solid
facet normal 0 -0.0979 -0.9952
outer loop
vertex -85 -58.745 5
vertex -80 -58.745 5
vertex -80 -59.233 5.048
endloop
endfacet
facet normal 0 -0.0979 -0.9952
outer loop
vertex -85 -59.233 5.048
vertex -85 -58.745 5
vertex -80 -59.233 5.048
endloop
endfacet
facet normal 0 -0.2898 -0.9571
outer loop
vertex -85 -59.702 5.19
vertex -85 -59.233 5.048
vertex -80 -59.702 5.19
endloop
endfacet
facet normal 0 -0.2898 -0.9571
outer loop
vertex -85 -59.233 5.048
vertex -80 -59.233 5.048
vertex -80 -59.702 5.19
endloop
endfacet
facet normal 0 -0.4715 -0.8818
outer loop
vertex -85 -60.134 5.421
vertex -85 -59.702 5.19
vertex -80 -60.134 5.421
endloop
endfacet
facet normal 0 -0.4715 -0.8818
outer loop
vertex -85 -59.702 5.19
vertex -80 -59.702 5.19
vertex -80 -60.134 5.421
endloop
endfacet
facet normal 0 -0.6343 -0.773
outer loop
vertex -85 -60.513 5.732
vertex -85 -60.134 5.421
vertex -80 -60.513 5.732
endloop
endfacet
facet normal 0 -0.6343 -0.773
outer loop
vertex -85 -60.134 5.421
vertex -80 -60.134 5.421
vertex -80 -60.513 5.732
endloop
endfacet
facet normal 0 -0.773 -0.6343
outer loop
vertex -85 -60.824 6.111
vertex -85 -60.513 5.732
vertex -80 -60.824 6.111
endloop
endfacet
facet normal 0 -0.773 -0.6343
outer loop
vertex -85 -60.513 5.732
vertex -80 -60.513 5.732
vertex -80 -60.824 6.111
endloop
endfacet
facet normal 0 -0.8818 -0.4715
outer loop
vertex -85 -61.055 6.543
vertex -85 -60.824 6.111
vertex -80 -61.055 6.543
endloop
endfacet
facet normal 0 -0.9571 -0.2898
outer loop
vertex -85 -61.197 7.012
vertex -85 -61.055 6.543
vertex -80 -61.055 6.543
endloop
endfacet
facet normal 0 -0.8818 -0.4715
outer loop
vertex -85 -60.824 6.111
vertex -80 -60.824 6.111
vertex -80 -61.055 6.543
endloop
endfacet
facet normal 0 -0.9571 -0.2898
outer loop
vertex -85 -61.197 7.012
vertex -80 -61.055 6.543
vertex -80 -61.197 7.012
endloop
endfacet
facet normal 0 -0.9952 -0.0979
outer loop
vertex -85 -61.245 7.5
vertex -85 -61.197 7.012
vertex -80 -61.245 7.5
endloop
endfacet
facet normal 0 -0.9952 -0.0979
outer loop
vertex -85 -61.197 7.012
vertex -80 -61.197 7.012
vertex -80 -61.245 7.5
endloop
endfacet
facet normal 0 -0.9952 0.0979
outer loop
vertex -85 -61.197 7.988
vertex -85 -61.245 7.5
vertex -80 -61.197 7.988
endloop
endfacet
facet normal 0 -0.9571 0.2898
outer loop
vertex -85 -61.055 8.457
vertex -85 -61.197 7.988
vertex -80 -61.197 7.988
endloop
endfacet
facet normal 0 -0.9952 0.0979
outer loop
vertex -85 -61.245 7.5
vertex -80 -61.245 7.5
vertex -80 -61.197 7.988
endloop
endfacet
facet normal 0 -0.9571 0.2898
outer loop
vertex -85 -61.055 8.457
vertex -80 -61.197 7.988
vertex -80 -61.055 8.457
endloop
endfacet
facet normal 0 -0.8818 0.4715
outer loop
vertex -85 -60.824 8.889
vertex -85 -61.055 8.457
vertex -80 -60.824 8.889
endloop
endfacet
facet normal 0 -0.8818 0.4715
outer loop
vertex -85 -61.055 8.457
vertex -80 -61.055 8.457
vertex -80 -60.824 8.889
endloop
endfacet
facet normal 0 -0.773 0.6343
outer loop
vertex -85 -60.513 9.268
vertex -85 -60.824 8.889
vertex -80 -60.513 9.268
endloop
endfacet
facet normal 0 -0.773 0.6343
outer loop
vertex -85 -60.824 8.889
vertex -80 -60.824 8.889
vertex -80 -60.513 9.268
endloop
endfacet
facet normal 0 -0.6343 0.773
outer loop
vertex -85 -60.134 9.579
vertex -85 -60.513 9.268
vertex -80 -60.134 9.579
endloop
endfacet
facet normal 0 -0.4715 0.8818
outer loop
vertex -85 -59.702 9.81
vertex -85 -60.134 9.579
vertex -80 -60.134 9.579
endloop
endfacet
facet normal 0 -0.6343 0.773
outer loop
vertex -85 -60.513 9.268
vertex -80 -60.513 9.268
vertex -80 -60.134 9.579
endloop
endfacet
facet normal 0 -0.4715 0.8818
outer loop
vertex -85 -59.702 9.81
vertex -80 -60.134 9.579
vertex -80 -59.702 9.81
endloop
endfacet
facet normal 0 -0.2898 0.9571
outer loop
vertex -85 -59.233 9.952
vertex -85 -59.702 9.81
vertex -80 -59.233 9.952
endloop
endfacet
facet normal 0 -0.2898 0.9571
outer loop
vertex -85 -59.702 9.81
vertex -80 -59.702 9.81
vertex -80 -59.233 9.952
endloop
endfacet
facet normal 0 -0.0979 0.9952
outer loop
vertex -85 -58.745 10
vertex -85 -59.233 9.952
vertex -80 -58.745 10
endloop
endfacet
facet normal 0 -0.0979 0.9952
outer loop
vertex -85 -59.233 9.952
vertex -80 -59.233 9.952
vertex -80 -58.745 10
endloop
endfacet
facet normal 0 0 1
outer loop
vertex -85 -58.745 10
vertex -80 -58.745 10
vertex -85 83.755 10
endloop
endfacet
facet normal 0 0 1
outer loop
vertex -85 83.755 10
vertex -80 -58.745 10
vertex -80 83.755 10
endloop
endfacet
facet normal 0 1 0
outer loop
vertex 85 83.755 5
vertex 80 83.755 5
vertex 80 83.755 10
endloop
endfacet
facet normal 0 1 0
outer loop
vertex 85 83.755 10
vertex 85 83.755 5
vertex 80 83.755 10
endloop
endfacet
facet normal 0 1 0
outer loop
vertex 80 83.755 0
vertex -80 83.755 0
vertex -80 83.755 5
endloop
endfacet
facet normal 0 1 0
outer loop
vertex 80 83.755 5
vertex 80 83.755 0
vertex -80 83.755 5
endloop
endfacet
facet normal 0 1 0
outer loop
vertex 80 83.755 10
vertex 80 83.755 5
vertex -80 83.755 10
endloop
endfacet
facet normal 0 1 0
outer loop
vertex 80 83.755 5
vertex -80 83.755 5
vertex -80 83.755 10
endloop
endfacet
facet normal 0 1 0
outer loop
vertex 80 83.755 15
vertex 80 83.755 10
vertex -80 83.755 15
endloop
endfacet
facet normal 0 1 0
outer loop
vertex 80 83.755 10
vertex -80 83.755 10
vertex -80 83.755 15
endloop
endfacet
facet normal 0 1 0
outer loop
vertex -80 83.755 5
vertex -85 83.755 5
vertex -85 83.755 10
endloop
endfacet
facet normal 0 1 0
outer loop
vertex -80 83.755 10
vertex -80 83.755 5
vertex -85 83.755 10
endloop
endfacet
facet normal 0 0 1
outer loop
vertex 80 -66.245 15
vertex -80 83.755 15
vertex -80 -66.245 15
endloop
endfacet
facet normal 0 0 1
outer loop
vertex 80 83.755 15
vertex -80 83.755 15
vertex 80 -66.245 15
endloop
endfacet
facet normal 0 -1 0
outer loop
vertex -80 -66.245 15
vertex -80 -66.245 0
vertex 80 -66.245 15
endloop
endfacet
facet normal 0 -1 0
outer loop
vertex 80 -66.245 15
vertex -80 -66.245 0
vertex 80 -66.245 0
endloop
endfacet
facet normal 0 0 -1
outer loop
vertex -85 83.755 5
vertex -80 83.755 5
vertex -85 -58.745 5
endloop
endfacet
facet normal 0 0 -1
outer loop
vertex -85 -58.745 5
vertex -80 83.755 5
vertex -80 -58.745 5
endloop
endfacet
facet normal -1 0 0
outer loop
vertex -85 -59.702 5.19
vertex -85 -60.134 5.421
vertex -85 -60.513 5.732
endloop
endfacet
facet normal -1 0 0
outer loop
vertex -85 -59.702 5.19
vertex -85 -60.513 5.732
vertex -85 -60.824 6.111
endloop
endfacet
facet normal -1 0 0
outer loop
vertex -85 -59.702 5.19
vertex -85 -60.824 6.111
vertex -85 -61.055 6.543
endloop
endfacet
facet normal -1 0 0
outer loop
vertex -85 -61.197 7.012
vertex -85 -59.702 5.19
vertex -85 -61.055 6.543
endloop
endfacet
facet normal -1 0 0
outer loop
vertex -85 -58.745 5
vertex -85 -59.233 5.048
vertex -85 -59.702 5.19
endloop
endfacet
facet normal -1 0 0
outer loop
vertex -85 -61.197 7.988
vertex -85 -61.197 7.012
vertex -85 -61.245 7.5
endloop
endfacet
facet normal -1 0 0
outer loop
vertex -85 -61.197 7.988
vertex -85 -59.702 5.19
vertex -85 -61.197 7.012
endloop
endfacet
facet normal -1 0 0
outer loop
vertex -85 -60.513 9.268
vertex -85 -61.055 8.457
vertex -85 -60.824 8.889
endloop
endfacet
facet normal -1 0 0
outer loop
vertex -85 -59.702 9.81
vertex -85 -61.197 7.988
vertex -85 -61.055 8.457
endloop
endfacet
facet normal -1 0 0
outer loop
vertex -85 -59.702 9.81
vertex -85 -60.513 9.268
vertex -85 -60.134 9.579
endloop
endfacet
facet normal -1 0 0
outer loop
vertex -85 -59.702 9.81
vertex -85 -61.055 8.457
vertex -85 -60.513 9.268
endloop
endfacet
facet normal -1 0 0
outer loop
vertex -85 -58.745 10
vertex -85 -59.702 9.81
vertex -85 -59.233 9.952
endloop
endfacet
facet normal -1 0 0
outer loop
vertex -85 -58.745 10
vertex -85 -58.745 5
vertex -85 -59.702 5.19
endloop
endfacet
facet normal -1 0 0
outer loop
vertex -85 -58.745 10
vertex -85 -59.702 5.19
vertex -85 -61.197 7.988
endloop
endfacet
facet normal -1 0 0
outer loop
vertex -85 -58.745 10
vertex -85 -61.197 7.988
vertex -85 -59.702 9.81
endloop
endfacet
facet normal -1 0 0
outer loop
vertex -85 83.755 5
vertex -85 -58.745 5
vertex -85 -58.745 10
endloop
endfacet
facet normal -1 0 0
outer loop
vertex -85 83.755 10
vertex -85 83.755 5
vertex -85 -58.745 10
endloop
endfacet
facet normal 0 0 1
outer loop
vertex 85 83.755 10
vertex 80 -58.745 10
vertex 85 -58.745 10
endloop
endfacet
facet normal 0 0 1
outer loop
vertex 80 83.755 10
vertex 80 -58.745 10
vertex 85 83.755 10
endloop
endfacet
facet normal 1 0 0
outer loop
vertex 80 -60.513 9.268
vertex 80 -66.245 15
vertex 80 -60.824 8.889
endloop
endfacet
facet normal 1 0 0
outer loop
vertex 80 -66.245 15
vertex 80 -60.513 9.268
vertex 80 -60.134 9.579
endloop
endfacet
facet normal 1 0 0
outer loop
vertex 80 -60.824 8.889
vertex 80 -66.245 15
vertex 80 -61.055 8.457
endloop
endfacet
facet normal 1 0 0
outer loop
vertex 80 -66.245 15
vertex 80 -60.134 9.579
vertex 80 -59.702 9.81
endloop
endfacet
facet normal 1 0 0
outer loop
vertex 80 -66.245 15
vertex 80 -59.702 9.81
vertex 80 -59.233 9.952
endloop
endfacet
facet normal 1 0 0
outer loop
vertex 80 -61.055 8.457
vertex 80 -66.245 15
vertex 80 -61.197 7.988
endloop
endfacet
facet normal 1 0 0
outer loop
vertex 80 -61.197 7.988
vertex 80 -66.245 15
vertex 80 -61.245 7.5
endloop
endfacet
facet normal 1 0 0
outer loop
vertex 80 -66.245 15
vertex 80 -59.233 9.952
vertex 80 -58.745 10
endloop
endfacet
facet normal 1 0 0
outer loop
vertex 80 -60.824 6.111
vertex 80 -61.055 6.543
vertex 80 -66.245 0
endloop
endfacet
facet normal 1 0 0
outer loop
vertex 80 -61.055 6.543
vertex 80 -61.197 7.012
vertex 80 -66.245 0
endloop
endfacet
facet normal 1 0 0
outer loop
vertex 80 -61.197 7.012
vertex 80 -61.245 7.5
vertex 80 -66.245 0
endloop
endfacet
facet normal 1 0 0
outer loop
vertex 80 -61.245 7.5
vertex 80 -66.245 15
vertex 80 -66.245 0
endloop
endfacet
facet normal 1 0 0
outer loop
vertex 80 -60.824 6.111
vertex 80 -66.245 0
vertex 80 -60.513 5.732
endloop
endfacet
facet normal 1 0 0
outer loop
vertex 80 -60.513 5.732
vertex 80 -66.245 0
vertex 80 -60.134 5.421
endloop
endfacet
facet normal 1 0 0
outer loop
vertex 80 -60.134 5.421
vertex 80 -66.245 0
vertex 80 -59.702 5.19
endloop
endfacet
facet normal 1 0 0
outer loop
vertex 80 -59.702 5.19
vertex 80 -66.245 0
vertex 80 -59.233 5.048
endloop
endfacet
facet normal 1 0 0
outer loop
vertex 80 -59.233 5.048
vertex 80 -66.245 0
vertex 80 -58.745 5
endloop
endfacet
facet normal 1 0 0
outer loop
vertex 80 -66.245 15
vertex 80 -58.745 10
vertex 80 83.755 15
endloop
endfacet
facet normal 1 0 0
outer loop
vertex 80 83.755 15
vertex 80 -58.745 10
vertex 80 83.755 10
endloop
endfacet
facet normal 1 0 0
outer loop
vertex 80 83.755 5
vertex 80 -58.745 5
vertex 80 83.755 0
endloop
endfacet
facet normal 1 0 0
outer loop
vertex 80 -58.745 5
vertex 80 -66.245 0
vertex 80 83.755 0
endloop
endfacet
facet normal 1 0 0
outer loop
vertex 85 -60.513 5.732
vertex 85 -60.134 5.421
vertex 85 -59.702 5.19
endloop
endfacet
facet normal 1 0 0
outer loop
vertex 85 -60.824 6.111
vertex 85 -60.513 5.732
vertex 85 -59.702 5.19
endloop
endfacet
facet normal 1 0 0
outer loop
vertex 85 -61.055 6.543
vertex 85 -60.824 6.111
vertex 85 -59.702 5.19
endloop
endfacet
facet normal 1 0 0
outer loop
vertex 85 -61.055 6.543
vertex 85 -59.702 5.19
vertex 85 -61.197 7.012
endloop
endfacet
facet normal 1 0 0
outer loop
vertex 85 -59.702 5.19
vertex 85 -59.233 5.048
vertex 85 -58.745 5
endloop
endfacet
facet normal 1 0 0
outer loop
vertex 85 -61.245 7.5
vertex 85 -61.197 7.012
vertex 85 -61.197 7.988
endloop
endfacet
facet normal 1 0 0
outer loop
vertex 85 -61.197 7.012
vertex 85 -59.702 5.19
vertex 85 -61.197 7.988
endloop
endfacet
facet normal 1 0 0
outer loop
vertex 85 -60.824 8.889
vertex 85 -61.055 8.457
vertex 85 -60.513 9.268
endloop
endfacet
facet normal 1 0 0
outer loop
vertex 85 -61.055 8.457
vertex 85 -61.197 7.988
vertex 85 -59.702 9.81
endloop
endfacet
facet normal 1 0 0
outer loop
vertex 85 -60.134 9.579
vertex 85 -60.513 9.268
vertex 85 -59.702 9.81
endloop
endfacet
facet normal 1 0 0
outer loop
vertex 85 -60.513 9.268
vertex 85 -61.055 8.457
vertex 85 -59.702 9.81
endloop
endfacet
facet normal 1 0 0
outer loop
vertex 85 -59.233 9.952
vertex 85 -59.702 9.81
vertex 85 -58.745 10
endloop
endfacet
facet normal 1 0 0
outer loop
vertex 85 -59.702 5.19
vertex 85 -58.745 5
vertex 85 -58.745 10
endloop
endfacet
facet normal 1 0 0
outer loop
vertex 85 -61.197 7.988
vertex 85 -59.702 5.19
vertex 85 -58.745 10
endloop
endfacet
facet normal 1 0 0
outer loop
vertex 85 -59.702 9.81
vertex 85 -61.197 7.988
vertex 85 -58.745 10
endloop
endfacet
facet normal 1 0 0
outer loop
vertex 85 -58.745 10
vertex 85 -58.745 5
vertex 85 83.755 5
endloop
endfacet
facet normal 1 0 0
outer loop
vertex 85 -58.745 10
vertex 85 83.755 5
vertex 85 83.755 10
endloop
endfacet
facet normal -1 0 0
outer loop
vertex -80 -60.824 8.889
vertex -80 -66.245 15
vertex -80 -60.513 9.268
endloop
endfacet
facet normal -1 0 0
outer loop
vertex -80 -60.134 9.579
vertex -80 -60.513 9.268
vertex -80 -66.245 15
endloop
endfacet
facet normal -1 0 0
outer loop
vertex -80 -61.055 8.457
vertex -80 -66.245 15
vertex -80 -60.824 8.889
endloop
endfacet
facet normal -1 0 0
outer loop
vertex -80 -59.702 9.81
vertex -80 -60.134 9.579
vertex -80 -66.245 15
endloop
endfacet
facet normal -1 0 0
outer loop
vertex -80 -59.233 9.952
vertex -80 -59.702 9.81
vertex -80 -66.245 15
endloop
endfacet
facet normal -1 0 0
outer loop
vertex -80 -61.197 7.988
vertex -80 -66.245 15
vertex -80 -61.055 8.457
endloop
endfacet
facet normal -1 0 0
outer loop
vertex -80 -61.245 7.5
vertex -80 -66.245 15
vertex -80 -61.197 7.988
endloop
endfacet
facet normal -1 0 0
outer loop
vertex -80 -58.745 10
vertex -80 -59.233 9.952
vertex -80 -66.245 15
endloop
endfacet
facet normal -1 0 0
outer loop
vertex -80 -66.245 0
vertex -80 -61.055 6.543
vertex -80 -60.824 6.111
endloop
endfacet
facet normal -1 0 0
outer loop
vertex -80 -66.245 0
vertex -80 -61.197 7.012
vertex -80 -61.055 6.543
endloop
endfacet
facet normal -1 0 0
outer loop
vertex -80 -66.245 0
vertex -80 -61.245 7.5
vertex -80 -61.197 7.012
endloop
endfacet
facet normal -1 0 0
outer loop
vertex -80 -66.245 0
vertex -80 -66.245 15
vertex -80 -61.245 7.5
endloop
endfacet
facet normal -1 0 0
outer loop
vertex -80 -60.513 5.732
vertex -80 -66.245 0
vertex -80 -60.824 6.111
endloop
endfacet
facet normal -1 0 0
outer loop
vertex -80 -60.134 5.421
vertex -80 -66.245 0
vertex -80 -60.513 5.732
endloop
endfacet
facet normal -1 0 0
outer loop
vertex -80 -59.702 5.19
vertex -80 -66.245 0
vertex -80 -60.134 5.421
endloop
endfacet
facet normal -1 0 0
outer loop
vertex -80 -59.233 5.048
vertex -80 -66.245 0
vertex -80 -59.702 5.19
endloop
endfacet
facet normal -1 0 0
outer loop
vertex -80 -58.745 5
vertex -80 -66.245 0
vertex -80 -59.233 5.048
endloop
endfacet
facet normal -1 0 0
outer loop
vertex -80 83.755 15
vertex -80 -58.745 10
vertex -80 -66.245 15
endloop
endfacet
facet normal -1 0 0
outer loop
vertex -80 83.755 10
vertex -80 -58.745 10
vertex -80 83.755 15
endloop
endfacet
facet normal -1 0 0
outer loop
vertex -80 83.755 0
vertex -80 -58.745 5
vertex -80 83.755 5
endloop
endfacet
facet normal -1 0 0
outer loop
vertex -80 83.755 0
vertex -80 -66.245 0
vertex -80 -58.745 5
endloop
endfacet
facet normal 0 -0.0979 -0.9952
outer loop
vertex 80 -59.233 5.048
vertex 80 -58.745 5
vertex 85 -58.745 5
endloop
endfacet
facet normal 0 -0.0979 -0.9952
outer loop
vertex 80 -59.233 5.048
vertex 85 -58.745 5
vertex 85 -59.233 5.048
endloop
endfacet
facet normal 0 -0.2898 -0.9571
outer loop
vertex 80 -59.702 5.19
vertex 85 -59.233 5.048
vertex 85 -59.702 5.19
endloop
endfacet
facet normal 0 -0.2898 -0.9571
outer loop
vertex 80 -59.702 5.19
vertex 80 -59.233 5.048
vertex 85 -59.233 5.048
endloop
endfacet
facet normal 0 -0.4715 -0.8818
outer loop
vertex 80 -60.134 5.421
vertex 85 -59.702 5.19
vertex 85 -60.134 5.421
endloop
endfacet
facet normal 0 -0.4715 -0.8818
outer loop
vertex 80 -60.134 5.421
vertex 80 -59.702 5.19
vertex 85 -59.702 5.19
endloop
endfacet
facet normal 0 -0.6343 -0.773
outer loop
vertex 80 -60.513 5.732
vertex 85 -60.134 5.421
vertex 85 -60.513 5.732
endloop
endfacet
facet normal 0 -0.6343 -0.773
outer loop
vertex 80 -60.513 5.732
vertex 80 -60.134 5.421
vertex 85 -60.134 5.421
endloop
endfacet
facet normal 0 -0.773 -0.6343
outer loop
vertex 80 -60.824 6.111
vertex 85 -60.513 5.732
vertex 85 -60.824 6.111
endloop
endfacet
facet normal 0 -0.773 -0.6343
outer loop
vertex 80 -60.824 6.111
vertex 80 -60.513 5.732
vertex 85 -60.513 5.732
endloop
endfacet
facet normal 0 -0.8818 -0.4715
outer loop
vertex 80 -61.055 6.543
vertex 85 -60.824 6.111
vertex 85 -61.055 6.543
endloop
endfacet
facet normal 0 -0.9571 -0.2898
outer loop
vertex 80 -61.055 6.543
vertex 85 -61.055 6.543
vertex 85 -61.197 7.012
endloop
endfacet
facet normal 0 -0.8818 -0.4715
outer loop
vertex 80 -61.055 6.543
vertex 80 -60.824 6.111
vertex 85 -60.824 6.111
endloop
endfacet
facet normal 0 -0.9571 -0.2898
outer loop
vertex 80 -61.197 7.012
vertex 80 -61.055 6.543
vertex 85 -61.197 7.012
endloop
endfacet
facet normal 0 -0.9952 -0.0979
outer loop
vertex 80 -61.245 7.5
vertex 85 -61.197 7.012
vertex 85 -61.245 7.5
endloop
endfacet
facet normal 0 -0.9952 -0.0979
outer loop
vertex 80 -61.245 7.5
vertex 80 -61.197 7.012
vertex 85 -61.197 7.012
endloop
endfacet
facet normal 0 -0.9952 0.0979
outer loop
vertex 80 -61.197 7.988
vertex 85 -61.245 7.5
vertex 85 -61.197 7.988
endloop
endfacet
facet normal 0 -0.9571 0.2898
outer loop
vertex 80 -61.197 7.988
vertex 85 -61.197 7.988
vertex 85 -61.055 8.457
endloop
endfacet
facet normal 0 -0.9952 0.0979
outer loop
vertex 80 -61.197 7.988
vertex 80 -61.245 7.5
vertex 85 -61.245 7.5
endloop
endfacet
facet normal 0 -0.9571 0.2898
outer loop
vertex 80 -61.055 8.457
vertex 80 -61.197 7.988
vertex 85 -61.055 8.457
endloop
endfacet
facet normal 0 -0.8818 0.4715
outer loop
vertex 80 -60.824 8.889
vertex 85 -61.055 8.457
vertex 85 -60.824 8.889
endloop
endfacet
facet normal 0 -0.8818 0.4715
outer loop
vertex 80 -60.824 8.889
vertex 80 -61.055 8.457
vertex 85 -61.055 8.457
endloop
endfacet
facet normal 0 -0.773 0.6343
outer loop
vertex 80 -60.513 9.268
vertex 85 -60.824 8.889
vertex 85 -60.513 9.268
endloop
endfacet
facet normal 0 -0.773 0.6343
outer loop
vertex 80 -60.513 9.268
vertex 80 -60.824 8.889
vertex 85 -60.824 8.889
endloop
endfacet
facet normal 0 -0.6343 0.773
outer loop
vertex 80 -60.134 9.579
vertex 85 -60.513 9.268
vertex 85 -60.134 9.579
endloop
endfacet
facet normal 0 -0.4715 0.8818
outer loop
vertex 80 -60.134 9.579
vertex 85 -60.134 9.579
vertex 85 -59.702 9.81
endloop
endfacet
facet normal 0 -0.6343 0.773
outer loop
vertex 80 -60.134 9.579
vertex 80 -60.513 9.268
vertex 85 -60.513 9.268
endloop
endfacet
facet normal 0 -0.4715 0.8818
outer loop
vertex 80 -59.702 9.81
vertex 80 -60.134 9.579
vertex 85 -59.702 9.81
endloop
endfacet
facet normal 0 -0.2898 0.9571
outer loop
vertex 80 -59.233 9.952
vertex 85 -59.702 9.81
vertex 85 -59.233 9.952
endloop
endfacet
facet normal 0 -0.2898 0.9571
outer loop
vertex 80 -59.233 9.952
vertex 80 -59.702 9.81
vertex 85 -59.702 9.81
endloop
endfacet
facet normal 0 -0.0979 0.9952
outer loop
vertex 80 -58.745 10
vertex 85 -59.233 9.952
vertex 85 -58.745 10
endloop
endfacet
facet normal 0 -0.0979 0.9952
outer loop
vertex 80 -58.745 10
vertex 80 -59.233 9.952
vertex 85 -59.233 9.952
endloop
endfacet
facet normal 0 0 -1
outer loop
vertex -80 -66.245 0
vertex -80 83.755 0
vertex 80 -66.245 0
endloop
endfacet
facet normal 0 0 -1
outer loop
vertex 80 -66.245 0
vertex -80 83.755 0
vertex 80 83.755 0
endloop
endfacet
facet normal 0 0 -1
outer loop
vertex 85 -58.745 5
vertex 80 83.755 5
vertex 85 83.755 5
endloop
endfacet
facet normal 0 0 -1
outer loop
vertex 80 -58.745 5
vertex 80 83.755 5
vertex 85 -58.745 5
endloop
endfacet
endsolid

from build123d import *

# Parameters (mm, degrees)
SKETCH1_W           = 160
SKETCH1_H           = 150
BOSS_EXTRUDE1_DEPTH = 15
BOSS_EXTRUDE2_DEPTH = 5
CUT_EXTRUDE1_DEPTH  = 5


with BuildPart() as part:
    # Sketch1 → Boss-Extrude1 (new body)
    with BuildSketch(Plane.XY):
        with Locations((0, 8.754863813)):
            Rectangle(SKETCH1_W, SKETCH1_H)
    extrude(amount=BOSS_EXTRUDE1_DEPTH)

    # Sketch2 → Boss-Extrude2 (add)
    with BuildSketch(Plane(origin=(80, 0, 0), x_dir=(0, 0, -1), z_dir=(1, 0, 0))):
        with BuildLine():
            Line((-10, -58.745136187), (-10, 89.520228405))
            ThreePointArc((-10, 89.520228405), (-7.5, 92.020228405), (-5, 89.520228405))
            Line((-5, 89.520228405), (-5, -58.745136187))
            ThreePointArc((-5, -58.745136187), (-7.5, -61.245136187), (-10, -58.745136187))
        make_face()
    boss_extrude2 = extrude(amount=BOSS_EXTRUDE2_DEPTH)

    # Mirror1: Boss-Extrude2 across plane
    add(boss_extrude2.mirror(Plane(origin=(0, 0, 0), x_dir=(0, 0, 1), z_dir=(1, 0, 0))))

    # Sketch3 → Cut-Extrude1 (cut)
    with BuildSketch(Plane.ZY.offset(85)):
        with BuildLine():
            Line((5, 83.754863813), (10, 83.754863813))
            Line((10, 83.754863813), (10, 89.520228405))
            ThreePointArc((10, 89.520228405), (7.5, 92.020228405), (5, 89.520228405))
            Line((5, 89.520228405), (5, 83.754863813))
        make_face()
    cut_extrude1 = extrude(amount=-CUT_EXTRUDE1_DEPTH, mode=Mode.SUBTRACT)

    # Mirror2: Cut-Extrude1 across plane
    add(cut_extrude1.mirror(Plane(origin=(0, 0, 0), x_dir=(0, 0, 1), z_dir=(1, 0, 0))), mode=Mode.SUBTRACT)


solid = part.part
